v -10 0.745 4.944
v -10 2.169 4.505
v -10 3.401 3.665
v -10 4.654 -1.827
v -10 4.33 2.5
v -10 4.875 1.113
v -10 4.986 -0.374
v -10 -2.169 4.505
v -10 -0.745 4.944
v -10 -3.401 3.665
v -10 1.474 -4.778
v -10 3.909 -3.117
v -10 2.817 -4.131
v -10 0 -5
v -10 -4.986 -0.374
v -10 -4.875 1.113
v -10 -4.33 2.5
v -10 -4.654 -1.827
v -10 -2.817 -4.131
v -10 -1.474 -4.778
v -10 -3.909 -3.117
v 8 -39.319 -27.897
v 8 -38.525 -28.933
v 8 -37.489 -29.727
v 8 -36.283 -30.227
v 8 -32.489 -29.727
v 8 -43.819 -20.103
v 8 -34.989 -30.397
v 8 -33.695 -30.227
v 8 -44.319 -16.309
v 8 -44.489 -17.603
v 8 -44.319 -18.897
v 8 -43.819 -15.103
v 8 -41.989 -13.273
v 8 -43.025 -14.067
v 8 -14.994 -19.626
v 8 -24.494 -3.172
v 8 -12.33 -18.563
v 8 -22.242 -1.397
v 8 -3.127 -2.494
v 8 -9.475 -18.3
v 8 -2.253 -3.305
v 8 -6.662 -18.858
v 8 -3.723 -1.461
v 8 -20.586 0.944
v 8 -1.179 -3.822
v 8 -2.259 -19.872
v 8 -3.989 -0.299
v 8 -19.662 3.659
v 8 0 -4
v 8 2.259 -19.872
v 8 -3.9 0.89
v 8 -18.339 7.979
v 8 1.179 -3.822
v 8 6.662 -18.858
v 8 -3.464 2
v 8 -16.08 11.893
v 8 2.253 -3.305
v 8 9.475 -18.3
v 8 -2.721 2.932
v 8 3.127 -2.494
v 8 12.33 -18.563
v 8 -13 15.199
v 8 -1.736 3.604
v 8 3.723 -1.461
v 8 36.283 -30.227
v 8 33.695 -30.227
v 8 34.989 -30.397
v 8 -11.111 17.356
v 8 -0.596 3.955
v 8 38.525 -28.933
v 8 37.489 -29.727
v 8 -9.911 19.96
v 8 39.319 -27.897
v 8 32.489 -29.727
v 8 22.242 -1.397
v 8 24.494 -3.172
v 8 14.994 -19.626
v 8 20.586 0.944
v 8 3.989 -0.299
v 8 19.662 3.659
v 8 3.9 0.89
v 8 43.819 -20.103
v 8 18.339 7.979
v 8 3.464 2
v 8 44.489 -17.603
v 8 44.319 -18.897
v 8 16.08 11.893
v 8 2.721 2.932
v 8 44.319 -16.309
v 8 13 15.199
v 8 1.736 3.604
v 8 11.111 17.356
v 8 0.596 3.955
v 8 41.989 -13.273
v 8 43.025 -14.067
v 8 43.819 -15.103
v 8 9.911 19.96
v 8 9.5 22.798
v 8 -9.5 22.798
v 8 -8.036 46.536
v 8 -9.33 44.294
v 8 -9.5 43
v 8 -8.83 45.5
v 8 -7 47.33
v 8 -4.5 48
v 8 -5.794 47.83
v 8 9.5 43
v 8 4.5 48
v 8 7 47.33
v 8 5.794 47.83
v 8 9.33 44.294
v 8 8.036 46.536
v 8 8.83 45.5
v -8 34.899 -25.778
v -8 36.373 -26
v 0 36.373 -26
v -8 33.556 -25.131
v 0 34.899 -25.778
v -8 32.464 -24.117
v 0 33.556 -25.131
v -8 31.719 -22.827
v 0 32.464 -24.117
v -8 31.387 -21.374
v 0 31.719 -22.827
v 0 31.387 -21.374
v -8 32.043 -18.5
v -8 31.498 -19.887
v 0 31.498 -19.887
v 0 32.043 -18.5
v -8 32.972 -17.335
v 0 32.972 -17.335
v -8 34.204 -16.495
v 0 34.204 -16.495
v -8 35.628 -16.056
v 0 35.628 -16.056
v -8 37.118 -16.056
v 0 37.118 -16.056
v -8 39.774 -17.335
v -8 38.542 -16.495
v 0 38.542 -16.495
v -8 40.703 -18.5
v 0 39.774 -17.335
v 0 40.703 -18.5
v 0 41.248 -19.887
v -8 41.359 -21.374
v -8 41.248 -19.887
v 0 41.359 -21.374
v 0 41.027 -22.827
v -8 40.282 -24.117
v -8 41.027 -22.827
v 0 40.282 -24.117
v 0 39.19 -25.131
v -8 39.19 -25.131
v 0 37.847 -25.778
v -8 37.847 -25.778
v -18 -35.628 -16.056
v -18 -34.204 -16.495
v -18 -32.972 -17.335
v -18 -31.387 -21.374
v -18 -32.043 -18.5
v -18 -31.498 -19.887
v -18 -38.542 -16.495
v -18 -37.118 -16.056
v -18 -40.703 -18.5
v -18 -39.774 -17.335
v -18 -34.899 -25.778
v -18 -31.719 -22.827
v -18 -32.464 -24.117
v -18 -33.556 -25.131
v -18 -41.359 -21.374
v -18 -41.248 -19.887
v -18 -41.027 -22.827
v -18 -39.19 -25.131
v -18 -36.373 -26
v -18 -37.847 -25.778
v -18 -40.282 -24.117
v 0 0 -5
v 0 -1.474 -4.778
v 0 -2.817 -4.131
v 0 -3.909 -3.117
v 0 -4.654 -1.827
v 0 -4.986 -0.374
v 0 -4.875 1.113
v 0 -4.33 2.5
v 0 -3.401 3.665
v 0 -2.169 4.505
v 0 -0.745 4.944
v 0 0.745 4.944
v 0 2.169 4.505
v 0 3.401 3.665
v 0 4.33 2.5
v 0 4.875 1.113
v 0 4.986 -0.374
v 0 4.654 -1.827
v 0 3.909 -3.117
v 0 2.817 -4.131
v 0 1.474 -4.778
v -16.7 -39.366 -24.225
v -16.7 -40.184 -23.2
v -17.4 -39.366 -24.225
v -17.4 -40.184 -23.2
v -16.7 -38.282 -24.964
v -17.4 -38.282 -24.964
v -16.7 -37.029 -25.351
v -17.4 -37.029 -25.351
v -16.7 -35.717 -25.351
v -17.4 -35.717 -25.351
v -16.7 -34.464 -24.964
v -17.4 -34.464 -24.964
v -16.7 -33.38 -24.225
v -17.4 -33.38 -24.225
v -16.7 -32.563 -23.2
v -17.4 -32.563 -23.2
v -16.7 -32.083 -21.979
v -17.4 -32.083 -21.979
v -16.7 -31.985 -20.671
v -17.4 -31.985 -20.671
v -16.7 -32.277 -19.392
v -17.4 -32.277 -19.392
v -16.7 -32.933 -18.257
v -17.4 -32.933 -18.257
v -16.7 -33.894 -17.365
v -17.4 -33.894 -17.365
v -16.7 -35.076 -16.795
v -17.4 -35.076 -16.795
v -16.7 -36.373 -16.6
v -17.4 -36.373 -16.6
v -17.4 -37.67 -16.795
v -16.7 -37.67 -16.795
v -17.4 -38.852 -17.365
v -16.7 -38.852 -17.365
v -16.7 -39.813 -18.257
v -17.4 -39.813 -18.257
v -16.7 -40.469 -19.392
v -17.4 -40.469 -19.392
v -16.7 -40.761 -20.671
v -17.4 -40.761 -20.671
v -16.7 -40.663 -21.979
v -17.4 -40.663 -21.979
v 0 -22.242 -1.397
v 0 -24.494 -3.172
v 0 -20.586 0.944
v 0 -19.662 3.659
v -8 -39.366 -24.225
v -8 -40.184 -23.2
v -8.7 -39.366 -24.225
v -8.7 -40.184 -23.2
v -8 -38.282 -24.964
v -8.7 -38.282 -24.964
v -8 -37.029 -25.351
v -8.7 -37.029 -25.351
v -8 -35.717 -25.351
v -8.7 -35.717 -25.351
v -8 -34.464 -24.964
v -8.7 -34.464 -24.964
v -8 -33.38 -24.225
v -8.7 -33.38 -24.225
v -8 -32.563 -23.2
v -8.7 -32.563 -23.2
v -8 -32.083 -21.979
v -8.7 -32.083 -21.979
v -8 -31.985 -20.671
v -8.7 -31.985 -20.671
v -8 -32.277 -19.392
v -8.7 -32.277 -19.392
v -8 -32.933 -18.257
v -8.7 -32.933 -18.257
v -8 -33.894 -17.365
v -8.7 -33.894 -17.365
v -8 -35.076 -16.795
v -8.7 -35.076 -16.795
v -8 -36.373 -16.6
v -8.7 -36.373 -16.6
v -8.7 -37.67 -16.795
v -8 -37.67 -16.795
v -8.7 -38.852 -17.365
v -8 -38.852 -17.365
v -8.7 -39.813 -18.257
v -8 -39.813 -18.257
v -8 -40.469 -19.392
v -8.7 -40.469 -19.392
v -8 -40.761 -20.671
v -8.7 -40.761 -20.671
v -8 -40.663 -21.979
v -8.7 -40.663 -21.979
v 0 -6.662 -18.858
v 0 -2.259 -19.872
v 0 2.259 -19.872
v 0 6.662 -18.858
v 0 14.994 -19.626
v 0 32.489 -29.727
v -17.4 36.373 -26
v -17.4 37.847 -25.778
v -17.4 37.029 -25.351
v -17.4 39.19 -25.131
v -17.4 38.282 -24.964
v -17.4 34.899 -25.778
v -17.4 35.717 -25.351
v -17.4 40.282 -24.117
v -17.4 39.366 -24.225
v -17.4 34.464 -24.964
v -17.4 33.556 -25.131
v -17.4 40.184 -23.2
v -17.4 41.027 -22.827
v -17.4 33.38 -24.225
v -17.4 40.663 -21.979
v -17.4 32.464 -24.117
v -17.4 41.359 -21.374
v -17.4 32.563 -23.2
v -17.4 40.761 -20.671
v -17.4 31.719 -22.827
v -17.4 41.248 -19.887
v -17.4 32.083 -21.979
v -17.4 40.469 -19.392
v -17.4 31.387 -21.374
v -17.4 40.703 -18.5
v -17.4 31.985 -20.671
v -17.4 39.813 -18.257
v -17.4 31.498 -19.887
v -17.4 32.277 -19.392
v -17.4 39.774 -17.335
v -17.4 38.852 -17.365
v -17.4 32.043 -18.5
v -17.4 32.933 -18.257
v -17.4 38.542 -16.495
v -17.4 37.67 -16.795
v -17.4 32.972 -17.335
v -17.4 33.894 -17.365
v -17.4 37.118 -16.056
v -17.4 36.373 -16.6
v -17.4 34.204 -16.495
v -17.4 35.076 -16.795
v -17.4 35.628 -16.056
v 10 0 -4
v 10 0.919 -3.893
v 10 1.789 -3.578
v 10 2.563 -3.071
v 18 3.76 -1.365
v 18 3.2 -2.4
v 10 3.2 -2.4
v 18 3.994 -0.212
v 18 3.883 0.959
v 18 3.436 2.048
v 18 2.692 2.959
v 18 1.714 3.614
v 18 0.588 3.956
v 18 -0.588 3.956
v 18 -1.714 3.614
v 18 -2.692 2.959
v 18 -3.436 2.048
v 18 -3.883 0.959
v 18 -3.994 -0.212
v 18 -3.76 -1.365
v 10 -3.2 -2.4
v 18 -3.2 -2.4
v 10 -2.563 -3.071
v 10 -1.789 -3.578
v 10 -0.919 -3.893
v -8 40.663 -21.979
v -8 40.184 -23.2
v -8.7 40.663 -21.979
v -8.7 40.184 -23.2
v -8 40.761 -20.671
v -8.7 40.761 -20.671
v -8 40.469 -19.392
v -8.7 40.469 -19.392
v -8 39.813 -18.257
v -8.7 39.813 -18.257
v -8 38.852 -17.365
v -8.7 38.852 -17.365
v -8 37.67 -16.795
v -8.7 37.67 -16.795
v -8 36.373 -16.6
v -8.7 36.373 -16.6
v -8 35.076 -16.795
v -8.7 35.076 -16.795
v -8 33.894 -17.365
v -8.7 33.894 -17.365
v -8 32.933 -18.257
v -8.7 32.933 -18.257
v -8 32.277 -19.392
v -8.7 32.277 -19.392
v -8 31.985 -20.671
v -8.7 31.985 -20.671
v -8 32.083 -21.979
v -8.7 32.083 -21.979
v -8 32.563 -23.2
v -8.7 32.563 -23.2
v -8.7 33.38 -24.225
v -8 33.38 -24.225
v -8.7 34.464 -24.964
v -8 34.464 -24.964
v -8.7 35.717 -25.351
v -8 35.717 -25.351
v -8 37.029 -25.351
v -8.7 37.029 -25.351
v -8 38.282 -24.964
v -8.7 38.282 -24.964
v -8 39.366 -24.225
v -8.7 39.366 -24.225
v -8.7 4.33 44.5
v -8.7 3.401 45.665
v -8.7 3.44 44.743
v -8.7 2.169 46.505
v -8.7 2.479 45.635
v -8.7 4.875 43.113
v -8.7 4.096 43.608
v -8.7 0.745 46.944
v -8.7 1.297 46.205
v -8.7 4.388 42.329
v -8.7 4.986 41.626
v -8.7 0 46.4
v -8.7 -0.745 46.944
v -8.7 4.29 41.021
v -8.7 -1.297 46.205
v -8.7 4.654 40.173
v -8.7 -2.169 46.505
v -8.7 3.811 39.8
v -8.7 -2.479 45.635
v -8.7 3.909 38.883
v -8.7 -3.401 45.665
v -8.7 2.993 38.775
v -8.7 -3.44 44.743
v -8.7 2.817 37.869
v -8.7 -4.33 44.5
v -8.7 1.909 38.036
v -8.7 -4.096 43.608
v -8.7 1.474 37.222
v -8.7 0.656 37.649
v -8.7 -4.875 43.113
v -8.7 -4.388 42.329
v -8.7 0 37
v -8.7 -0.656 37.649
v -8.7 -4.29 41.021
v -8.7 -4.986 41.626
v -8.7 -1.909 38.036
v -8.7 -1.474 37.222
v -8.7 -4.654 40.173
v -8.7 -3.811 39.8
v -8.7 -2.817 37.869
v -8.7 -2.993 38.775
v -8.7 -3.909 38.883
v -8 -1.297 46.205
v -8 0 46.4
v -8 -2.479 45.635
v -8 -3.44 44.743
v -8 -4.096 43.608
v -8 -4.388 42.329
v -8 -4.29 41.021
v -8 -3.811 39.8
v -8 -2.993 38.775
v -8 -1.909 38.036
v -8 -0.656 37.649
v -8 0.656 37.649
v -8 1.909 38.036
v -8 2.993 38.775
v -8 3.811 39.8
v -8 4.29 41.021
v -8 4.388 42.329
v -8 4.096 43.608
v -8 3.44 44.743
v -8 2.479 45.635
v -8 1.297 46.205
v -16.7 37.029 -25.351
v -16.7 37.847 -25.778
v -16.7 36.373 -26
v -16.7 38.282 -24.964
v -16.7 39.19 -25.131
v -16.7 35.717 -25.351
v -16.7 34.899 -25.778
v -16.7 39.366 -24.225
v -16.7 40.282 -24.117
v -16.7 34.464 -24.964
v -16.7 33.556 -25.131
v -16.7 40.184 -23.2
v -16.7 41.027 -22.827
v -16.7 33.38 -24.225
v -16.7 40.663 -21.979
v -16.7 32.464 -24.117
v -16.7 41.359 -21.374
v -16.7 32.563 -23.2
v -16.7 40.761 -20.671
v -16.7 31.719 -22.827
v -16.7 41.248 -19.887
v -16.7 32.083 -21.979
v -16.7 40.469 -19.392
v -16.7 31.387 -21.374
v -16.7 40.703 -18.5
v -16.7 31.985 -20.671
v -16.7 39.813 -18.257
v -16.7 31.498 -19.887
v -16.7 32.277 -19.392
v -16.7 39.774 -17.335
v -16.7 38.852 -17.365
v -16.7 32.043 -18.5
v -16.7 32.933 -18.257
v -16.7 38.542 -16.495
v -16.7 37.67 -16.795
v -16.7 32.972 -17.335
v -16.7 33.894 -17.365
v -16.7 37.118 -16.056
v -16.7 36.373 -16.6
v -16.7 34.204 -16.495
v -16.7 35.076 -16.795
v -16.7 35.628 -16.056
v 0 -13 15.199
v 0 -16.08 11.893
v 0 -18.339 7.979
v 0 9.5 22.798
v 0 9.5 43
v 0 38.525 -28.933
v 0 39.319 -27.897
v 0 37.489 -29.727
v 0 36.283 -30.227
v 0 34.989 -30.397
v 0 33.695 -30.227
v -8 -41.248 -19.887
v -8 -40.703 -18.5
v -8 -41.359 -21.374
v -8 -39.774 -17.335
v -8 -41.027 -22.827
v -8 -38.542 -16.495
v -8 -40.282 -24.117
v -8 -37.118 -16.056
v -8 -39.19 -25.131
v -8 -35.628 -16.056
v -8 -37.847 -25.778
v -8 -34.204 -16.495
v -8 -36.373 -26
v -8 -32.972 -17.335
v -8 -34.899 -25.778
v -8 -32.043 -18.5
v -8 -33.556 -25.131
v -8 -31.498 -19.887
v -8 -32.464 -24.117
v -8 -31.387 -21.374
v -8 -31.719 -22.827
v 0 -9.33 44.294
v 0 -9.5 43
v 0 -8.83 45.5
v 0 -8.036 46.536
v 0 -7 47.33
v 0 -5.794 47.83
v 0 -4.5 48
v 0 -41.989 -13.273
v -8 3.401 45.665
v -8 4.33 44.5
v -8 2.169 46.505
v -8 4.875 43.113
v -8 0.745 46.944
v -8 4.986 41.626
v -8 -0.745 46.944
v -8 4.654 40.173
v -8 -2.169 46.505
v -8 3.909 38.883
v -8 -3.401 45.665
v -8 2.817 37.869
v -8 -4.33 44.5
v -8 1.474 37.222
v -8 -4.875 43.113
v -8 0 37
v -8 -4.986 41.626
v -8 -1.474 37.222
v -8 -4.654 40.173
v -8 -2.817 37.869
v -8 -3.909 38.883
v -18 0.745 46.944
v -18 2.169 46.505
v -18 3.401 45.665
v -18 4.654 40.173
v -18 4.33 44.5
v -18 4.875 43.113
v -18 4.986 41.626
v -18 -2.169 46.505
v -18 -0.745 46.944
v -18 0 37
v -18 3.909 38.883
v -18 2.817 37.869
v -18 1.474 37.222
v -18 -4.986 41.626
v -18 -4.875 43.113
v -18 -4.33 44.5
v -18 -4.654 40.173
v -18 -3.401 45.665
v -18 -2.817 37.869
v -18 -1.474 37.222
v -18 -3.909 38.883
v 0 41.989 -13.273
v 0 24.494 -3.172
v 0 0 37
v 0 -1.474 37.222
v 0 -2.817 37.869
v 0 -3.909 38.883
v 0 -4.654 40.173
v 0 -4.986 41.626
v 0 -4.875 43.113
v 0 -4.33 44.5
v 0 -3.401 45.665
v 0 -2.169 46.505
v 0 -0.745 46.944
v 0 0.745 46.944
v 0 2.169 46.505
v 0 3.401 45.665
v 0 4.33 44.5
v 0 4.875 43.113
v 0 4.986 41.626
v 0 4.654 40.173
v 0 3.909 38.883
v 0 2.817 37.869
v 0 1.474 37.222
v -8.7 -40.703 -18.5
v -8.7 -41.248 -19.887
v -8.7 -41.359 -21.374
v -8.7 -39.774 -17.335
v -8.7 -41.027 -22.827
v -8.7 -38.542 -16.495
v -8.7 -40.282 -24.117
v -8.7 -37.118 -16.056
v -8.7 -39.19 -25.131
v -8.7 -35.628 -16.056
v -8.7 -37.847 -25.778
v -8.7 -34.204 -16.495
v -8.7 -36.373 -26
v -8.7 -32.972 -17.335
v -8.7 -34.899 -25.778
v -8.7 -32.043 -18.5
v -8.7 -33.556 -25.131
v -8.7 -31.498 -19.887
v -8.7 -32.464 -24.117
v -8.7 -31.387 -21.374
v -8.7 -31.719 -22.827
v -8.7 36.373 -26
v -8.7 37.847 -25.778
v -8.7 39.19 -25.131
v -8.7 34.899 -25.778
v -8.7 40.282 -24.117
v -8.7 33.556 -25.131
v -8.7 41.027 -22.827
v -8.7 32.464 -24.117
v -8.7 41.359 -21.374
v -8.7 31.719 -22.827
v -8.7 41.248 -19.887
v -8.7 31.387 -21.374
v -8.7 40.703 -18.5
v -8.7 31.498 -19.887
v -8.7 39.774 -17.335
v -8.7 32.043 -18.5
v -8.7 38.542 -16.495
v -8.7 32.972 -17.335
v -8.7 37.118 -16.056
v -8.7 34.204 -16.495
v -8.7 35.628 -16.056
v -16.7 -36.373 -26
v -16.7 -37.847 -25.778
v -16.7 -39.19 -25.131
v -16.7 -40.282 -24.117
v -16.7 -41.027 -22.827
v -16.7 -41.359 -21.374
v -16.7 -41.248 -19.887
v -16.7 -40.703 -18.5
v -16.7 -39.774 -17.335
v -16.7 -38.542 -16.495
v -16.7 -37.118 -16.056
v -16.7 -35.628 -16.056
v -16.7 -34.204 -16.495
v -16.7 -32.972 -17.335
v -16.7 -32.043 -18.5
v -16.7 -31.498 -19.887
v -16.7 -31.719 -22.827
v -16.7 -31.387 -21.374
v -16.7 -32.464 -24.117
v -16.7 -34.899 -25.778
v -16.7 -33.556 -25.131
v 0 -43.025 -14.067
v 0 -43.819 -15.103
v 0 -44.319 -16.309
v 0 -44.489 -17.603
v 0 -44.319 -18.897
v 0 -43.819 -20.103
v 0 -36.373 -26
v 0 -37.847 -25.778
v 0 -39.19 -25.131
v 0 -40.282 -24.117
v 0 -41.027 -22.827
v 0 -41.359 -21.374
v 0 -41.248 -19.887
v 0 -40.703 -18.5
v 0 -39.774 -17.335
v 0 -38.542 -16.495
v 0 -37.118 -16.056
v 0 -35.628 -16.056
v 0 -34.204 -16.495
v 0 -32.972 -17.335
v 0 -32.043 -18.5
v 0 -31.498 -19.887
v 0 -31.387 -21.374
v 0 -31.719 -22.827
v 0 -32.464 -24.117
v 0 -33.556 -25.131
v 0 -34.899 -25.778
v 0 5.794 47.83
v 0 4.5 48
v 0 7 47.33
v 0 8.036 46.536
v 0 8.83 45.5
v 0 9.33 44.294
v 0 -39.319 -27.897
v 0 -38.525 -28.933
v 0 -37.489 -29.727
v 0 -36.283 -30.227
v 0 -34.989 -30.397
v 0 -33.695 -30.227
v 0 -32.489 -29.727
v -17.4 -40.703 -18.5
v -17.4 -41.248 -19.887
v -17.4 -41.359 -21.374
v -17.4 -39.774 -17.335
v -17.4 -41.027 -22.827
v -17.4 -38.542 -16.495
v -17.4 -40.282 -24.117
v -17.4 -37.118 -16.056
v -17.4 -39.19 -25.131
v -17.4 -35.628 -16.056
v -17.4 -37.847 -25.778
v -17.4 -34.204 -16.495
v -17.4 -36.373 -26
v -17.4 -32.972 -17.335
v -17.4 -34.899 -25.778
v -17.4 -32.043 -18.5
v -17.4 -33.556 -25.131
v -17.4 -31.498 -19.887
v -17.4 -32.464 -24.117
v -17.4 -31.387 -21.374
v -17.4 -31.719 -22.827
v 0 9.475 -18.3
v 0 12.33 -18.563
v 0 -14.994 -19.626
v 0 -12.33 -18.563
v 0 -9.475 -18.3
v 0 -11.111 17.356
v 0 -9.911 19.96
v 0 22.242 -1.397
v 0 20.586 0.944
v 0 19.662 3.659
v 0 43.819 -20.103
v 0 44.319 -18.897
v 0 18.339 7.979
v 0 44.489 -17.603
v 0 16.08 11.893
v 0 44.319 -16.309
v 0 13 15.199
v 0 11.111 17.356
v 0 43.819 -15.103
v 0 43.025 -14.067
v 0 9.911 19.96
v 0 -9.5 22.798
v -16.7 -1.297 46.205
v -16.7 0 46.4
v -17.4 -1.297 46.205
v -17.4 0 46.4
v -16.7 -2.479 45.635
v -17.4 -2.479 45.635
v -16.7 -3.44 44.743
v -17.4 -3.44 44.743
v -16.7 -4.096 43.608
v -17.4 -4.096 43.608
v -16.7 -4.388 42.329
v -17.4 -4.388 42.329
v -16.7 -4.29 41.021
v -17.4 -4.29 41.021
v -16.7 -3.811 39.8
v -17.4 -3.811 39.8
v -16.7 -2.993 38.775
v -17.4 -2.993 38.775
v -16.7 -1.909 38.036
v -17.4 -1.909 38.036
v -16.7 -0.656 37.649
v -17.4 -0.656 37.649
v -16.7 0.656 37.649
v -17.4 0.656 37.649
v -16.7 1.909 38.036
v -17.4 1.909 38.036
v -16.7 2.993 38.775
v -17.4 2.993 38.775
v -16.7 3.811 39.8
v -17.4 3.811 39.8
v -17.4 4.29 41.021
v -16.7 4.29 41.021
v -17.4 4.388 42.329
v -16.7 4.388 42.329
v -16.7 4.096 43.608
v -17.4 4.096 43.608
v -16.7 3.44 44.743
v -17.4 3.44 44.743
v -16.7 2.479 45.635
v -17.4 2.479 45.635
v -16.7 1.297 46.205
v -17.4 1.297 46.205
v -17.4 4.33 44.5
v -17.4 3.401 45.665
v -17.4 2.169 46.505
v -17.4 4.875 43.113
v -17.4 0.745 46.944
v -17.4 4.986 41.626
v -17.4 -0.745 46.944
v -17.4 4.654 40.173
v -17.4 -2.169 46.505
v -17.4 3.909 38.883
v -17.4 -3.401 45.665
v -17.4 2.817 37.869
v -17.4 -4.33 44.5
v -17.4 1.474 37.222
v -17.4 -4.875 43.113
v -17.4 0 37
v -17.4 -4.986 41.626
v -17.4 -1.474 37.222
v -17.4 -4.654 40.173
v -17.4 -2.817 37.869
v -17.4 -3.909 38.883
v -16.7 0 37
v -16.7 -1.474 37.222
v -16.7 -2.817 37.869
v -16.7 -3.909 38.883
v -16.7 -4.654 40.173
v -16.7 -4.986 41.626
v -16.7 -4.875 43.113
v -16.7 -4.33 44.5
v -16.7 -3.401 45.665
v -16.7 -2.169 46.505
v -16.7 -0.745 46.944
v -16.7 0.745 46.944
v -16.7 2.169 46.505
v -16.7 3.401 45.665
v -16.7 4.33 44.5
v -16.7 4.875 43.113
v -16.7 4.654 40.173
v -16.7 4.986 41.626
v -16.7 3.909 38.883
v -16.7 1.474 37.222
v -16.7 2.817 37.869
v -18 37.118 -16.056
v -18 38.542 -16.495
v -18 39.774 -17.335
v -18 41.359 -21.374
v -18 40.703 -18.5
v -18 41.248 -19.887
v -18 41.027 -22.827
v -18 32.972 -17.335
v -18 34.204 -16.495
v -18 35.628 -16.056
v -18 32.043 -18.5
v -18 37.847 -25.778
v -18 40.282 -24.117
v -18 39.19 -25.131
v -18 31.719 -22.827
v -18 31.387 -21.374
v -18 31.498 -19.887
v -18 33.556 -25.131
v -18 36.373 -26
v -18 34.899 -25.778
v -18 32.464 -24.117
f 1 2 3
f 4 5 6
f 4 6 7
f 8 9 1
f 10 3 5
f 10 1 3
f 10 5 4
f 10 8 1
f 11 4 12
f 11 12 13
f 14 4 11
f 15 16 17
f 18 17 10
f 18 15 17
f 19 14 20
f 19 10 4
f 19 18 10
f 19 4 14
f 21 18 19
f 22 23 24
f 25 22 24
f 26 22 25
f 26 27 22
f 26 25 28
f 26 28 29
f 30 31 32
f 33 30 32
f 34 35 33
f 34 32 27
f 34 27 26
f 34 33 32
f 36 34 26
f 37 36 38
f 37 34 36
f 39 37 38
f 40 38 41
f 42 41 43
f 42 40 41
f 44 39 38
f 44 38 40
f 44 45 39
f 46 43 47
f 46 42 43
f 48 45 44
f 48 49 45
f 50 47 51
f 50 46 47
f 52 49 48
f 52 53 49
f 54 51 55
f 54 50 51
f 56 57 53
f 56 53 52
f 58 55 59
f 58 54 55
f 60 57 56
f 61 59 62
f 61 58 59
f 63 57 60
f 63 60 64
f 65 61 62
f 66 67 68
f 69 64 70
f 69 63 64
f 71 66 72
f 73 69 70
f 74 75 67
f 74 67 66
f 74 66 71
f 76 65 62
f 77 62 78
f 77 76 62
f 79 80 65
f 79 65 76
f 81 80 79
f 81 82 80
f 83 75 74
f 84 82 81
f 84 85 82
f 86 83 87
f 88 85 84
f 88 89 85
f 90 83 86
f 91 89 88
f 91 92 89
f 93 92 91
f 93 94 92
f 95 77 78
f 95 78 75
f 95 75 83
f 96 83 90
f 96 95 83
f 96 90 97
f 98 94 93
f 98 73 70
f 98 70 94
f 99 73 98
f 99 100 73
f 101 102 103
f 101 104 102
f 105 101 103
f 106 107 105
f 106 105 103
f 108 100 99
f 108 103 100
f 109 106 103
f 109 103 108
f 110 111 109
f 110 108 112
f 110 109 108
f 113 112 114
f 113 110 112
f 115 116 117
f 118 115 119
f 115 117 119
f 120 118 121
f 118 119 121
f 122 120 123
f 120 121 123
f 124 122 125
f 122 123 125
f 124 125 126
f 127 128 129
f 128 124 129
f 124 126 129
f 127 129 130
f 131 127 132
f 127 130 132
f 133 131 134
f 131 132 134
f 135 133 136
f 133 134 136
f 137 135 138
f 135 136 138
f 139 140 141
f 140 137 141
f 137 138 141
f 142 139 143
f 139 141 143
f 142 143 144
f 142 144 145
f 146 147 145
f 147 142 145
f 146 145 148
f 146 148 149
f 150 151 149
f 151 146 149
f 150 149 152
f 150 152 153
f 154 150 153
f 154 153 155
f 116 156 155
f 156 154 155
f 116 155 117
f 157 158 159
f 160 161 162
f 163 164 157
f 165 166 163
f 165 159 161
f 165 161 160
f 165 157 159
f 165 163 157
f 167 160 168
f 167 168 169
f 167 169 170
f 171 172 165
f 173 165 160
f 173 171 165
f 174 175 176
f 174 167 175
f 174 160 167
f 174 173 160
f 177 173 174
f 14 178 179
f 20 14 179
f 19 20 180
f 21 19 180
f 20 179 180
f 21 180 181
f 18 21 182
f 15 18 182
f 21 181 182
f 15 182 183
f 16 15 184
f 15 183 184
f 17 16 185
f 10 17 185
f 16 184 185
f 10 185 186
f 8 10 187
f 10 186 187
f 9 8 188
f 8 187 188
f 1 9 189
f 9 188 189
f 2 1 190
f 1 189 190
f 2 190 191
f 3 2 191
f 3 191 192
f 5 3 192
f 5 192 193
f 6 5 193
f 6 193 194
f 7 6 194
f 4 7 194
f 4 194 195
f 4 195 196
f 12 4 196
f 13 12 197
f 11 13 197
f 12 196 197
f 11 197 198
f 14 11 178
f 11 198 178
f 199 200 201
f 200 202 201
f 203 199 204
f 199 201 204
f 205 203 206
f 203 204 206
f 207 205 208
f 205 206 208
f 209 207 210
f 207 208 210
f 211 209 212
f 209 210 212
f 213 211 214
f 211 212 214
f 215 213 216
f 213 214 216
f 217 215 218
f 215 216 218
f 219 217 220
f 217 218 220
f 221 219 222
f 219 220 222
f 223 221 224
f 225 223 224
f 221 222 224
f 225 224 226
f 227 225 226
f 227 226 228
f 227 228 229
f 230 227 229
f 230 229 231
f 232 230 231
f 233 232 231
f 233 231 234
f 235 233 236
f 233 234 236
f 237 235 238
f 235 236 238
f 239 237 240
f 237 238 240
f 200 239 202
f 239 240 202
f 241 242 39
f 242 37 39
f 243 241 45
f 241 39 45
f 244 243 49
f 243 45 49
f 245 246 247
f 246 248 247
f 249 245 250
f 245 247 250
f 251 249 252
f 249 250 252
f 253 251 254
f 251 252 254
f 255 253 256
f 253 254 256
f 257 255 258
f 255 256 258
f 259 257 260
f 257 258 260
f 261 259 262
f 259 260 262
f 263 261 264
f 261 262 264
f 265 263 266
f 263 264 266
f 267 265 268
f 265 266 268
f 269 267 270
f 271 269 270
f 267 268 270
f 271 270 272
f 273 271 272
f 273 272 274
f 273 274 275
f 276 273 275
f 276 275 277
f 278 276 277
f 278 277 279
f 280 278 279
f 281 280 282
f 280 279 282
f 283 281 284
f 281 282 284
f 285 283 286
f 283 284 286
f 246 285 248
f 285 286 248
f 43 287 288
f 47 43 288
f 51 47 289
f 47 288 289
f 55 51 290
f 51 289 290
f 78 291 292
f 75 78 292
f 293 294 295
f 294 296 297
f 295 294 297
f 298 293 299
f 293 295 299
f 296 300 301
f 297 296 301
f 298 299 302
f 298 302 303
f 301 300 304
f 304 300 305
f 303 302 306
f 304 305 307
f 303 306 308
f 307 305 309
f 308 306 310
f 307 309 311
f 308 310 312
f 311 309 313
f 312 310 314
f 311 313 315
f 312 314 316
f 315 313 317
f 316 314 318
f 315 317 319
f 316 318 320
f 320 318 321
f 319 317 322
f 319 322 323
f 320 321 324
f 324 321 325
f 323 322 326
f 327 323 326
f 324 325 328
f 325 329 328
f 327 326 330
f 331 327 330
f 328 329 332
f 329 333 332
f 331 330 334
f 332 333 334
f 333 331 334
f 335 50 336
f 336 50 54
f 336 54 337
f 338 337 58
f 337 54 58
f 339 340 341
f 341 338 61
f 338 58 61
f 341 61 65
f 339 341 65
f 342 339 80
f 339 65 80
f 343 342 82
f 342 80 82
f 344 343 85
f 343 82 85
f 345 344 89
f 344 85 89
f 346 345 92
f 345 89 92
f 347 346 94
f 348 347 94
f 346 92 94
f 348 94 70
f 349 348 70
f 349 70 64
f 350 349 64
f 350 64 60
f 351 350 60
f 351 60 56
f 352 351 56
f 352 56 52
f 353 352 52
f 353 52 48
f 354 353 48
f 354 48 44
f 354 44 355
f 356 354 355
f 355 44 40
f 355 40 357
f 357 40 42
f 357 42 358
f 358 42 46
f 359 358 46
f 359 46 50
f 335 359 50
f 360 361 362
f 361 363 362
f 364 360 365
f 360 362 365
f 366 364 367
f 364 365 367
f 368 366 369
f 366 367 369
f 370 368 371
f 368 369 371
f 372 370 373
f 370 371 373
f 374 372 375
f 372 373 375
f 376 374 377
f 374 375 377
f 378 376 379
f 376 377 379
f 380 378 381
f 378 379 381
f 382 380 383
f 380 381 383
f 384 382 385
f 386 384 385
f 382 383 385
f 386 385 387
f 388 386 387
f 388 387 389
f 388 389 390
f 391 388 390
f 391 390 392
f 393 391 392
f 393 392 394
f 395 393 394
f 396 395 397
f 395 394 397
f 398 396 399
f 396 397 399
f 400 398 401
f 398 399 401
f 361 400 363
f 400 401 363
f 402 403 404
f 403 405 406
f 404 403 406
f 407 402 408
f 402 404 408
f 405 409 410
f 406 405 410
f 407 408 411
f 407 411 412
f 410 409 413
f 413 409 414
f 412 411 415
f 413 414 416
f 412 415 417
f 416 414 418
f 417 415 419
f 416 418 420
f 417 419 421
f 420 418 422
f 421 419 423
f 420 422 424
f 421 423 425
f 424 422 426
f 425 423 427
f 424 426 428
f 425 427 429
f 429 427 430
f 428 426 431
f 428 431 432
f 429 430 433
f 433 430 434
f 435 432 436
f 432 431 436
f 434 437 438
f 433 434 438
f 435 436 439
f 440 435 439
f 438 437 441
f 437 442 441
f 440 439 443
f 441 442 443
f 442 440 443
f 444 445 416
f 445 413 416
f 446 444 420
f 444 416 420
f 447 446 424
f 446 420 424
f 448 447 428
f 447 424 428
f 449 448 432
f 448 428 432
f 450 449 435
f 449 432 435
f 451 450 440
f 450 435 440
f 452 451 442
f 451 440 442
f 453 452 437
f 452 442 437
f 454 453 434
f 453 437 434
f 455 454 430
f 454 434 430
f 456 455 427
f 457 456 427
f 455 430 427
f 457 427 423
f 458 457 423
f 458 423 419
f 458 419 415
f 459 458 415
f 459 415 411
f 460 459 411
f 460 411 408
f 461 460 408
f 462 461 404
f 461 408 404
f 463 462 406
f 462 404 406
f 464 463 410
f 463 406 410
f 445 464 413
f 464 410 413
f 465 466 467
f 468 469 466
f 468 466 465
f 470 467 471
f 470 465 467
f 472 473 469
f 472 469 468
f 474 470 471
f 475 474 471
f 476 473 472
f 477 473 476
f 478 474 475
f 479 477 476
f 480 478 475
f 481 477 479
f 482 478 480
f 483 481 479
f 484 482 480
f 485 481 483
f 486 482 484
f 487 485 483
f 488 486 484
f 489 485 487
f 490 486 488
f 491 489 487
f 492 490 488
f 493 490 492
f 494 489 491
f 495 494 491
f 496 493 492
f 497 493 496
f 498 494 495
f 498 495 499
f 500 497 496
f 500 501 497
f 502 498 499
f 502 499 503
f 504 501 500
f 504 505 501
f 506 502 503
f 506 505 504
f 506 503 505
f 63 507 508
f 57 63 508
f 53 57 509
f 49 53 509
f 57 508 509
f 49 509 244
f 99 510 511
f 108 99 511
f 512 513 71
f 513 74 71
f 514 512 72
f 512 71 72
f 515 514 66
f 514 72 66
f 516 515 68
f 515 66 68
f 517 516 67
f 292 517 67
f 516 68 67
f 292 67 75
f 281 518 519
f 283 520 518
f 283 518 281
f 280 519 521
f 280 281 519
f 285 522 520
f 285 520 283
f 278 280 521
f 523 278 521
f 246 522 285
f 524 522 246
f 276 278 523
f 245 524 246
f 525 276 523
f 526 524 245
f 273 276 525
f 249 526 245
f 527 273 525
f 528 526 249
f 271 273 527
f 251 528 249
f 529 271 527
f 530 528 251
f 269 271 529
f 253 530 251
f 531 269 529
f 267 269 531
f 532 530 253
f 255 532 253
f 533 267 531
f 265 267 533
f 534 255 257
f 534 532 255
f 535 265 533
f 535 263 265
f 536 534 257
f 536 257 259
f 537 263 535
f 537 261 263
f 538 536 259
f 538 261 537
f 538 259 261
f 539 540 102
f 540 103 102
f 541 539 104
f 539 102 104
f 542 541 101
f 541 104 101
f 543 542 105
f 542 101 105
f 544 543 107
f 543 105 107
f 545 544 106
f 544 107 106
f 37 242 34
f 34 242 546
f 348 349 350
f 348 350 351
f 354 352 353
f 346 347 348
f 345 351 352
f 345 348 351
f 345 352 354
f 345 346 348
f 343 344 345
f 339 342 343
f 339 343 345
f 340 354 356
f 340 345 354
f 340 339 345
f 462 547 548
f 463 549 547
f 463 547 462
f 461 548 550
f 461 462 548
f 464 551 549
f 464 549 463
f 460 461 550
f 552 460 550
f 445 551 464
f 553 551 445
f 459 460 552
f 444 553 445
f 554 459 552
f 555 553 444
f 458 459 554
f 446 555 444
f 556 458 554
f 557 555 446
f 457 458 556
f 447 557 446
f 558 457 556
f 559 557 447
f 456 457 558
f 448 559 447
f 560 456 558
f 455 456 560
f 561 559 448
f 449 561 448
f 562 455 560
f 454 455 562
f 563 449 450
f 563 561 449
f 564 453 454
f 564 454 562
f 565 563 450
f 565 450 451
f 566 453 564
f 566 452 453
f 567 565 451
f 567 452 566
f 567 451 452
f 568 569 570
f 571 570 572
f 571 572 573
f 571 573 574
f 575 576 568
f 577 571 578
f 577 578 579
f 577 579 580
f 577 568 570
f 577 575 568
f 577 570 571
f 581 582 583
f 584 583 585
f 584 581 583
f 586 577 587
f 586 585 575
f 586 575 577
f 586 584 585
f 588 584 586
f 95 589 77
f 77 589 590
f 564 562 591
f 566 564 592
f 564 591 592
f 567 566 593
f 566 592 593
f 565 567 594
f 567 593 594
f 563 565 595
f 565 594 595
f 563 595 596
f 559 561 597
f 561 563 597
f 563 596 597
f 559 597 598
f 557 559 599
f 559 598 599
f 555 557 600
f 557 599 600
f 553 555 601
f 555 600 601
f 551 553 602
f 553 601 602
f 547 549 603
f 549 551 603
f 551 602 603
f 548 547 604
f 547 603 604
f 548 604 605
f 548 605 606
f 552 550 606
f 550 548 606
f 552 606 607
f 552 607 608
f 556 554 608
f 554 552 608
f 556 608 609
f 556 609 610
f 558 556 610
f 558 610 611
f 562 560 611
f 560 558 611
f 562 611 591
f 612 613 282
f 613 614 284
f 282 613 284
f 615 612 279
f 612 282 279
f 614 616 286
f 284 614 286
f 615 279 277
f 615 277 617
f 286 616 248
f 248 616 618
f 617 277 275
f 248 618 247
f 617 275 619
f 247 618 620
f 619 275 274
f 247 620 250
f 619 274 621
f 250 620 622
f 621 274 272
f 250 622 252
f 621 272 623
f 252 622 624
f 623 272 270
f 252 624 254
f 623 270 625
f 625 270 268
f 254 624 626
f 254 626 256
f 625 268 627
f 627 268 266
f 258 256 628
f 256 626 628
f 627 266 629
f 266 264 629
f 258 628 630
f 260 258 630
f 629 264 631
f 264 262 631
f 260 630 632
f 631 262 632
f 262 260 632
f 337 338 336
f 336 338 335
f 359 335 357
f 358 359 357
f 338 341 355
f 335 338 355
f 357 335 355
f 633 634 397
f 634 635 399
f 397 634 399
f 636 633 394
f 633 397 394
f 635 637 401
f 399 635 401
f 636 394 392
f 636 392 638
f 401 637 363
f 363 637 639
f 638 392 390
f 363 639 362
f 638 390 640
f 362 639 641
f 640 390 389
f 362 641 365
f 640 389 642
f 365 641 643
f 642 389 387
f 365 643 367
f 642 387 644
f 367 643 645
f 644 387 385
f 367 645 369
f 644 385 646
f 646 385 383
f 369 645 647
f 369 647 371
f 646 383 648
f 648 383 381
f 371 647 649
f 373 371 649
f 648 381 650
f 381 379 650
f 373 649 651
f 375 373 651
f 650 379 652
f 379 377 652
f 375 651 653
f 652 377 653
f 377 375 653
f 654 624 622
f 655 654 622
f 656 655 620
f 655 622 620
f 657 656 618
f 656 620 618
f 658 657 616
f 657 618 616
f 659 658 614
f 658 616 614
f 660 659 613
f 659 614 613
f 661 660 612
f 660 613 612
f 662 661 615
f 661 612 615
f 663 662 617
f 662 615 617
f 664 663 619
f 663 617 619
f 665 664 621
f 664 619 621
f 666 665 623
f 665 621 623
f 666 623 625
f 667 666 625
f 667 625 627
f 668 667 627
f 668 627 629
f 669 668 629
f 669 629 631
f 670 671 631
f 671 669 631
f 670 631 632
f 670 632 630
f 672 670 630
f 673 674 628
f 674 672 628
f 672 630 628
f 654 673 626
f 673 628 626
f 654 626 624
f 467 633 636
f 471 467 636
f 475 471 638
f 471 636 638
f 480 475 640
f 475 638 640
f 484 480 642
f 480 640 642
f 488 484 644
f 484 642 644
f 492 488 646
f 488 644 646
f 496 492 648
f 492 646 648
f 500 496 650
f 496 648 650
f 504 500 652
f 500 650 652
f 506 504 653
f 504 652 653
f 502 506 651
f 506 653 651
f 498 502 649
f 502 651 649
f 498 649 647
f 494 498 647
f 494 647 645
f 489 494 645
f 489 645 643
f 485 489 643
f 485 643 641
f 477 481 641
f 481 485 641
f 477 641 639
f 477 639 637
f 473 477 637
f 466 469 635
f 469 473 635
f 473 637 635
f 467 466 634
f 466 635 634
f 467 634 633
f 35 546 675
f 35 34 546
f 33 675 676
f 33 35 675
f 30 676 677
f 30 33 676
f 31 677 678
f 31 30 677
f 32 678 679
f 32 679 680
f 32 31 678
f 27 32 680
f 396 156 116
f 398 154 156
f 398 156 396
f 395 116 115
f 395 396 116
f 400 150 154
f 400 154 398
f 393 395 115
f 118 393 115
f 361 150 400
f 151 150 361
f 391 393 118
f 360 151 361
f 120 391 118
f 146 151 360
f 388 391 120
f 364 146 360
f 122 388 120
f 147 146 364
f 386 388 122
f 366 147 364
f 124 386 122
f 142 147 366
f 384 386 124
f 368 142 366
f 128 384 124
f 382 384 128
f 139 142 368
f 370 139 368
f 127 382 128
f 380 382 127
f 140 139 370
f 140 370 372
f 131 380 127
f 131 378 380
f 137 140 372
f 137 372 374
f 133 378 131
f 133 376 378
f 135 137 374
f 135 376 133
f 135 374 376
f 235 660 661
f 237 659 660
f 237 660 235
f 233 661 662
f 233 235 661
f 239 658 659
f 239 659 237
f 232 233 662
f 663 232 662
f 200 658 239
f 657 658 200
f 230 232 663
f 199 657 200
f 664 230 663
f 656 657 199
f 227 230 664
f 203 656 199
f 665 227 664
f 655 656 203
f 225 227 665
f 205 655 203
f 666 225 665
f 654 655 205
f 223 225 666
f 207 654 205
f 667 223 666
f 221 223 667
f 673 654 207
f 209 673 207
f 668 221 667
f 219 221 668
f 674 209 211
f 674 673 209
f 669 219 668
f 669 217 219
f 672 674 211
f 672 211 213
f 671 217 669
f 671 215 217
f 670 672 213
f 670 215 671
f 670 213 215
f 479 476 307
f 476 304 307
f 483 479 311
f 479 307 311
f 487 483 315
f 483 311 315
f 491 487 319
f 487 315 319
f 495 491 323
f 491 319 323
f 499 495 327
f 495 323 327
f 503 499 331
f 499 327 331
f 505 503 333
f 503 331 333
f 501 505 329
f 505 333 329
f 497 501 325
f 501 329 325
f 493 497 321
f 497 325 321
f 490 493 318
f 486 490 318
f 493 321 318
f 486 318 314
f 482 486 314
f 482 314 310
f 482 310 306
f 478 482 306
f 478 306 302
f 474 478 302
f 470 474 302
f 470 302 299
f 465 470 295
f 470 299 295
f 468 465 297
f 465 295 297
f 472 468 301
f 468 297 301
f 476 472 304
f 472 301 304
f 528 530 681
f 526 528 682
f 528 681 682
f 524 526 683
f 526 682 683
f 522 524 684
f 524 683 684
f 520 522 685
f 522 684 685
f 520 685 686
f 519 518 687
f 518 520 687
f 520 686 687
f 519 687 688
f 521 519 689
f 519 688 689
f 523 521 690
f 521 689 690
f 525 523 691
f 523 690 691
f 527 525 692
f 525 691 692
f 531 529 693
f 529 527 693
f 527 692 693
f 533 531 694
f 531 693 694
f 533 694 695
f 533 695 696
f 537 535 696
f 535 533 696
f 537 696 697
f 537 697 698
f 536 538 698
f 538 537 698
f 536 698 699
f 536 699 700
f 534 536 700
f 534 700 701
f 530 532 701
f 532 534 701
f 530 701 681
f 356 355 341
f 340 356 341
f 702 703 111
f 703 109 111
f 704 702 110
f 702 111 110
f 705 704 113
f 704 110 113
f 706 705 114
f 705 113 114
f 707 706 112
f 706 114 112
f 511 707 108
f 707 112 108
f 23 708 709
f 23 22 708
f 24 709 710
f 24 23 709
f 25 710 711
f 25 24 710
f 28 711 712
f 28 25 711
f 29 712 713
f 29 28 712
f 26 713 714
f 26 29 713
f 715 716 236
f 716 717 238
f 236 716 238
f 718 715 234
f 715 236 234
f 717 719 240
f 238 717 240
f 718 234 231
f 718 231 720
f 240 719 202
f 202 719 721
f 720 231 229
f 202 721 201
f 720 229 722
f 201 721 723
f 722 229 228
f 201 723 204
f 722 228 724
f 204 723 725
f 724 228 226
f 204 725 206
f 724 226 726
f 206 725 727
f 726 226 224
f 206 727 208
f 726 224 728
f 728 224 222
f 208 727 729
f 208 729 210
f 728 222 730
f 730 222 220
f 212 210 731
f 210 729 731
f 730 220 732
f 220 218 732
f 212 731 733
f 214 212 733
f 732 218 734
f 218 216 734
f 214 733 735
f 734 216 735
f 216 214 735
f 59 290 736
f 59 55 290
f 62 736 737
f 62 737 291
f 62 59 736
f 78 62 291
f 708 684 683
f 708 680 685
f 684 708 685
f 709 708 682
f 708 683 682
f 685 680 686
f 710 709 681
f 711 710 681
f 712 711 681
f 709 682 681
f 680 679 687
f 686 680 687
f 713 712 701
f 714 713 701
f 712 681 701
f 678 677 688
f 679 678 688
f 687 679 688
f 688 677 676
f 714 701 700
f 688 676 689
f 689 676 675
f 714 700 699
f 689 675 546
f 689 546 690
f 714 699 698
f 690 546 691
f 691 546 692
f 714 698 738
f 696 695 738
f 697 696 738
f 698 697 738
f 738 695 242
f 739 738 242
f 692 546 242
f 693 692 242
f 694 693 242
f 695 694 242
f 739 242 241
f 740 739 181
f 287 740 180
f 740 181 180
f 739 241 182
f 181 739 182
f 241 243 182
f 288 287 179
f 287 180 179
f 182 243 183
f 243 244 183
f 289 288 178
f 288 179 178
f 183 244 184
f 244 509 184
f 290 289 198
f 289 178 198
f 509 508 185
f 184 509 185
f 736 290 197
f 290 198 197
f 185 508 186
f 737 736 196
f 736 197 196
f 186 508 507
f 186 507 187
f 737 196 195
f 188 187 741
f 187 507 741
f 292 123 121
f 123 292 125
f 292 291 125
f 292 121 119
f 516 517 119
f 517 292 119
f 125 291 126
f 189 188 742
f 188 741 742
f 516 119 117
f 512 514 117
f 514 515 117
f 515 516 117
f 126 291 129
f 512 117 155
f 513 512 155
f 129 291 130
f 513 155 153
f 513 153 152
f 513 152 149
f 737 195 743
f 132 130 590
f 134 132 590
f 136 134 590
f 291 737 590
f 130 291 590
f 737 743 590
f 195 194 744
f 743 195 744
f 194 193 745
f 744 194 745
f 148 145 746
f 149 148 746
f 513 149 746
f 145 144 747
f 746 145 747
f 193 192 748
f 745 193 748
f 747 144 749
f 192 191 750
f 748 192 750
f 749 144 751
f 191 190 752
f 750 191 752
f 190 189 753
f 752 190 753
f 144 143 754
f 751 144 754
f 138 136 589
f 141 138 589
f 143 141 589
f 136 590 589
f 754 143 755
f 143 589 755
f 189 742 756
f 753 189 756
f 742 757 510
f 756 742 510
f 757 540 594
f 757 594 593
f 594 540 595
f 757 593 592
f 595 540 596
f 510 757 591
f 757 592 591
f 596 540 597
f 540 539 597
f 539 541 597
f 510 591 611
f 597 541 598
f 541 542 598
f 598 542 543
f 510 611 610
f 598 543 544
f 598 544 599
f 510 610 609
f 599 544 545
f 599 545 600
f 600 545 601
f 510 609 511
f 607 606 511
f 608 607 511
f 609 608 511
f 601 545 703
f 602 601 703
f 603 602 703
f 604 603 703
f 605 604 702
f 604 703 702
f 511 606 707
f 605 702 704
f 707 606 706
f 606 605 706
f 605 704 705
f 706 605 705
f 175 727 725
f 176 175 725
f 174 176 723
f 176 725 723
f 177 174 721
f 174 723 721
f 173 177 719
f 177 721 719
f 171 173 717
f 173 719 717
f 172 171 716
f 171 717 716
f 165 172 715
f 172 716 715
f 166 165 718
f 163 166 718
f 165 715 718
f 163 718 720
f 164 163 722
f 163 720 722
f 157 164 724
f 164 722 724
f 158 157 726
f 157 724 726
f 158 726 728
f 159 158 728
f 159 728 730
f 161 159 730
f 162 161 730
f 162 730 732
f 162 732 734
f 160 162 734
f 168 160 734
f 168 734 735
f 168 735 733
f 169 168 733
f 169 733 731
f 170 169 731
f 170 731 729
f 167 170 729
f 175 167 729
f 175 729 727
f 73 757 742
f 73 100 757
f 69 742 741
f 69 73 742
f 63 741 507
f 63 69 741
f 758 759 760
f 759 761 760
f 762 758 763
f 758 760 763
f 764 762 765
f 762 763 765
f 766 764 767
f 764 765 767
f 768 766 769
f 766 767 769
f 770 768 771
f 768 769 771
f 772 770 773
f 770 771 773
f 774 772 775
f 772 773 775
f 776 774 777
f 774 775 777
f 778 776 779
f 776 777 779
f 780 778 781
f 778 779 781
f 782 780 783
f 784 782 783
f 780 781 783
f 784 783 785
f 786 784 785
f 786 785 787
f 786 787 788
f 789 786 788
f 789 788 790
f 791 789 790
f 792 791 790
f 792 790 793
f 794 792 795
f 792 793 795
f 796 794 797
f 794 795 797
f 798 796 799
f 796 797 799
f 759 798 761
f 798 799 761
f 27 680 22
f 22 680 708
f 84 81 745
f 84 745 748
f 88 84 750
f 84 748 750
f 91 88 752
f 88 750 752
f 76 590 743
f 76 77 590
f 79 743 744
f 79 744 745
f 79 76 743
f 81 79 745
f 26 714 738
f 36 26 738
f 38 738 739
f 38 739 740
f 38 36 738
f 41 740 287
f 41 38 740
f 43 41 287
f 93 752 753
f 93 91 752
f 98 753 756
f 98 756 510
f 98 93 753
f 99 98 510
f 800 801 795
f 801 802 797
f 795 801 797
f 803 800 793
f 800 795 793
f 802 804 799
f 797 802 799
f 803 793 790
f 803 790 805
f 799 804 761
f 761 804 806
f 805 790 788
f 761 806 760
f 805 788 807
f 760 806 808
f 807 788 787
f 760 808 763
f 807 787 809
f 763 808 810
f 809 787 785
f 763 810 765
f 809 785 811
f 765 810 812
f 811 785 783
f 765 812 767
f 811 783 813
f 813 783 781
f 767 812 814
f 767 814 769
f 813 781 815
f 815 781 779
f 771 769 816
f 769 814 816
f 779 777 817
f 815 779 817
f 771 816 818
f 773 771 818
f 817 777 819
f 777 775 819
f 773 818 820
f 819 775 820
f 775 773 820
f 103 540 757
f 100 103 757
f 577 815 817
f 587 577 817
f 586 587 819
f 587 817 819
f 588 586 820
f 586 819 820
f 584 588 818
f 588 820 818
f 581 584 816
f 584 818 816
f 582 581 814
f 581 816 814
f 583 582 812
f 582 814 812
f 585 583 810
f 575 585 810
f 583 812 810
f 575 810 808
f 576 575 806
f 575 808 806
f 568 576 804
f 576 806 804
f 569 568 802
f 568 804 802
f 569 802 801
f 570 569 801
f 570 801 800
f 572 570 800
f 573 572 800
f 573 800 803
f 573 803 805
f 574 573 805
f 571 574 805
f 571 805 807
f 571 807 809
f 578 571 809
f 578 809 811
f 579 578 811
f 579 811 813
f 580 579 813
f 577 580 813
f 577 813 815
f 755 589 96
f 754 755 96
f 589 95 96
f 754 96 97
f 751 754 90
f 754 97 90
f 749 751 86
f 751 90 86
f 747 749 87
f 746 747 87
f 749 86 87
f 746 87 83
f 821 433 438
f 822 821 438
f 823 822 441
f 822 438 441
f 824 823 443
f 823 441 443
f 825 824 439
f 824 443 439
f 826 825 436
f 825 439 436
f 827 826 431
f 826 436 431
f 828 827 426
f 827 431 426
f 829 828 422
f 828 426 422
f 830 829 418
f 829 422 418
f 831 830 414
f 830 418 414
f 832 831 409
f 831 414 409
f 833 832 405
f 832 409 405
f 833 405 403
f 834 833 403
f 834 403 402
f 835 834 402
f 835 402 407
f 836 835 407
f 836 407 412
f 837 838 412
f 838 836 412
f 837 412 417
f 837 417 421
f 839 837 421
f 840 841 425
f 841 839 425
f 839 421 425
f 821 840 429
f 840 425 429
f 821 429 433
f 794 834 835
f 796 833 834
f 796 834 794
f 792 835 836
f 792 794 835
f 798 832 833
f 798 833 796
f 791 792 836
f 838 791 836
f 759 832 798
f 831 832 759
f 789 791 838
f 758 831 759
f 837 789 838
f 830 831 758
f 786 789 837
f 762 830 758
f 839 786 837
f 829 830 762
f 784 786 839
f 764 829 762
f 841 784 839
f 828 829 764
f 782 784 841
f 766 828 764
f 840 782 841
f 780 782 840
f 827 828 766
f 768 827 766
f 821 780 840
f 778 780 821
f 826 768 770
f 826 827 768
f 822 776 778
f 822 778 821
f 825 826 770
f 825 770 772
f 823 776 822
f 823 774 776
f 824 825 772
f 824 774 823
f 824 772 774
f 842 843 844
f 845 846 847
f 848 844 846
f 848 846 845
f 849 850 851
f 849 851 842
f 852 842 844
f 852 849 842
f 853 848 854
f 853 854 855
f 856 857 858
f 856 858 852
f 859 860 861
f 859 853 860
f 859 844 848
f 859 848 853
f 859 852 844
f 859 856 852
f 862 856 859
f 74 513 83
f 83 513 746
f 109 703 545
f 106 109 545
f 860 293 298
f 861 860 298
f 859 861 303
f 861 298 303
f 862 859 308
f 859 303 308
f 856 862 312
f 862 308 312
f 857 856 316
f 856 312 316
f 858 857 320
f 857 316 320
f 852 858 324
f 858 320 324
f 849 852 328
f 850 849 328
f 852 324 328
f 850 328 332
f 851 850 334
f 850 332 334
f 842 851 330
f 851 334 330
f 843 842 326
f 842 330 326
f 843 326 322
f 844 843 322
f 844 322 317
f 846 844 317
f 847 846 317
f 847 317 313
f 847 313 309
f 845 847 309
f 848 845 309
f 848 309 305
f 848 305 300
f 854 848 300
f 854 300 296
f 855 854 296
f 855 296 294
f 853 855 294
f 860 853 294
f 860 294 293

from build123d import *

# Parameters (mm, degrees)
BOSS_EXTRUDE2_DEPTH = 8
FILLET1_R           = 10
FILLET3_R           = 5
FILLET4_R           = 5
SKETCH3_R           = 5
BOSS_EXTRUDE3_DEPTH = 10
SKETCH2_R           = 5
BOSS_EXTRUDE4_DEPTH = 18
SKETCH4_R           = 4
BOSS_EXTRUDE5_DEPTH = 10
CUT_EXTRUDE1_START  = -8
CUT_EXTRUDE1_DEPTH  = 8
SKETCH7_W           = 0.7
SKETCH7_H           = 1.2
CIRPATTERN1_COUNT   = 3


with BuildPart() as part:
    # Sketch1 → Boss-Extrude2 (new body)
    with BuildSketch(Plane.YZ):
        with BuildLine():
            Line((-19.991801075, -0.572616617), (-46.319219382, -15.772758664))
            Line((-46.319219382, -15.772758664), (-36.819219382, -32.227241336))
            Line((-36.819219382, -32.227241336), (-10.491801075, -17.027099289))
            ThreePointArc((-10.491801075, -17.027099289), (0, -20), (10.491801075, -17.027099289))
            Line((10.491801075, -17.027099289), (36.819219382, -32.227241336))
            Line((36.819219382, -32.227241336), (46.319219382, -15.772758664))
            Line((46.319219382, -15.772758664), (19.991801075, -0.572616617))
            ThreePointArc((19.991801075, -0.572616617), (17.320508076, 10), (9.5, 17.599715907))
            Line((9.5, 17.599715907), (9.5, 48))
            Line((9.5, 48), (-9.5, 48))
            Line((-9.5, 48), (-9.5, 17.599715907))
            ThreePointArc((-9.5, 17.599715907), (-17.320508076, 10), (-19.991801075, -0.572616617))
        make_face()
    extrude(amount=BOSS_EXTRUDE2_DEPTH)

    # Fillet1
    fillet1_edges = [part.edges().sort_by_distance(p)[0] for p in [
        (4, 9.5, 17.599715907),
        (4, 19.991801075, -0.572616617),
        (4, 10.491801075, -17.027099289),
        (4, -10.491801075, -17.027099289),
        (4, -19.991801075, -0.572616617),
        (4, -9.5, 17.599715907),
    ]]
    fillet(fillet1_edges, radius=FILLET1_R)

    # Fillet3
    fillet3_edges = [part.edges().sort_by_distance(p)[0] for p in [
        (4, -9.5, 48),
        (4, 9.5, 48),
    ]]
    fillet(fillet3_edges, radius=FILLET3_R)

    # Fillet4
    fillet4_edges = [part.edges().sort_by_distance(p)[0] for p in [
        (4, 46.319219382, -15.772758664),
        (4, 36.819219382, -32.227241336),
        (4, -36.819219382, -32.227241336),
        (4, -46.319219382, -15.772758664),
    ]]
    fillet(fillet4_edges, radius=FILLET4_R)

    # Sketch3 → Boss-Extrude3 (add)
    with BuildSketch(Plane(origin=(0, 0, 0), x_dir=(0, -1, 0), z_dir=(-1, 0, 0))):
        with Locations(Location((0, 0, 0), (0, 0, 270))):
            Circle(SKETCH3_R)
    extrude(amount=BOSS_EXTRUDE3_DEPTH)

    # Sketch2 → Boss-Extrude4 (add)
    with BuildSketch(Plane(origin=(0, 0, 0), x_dir=(0, -1, 0), z_dir=(-1, 0, 0))):
        with Locations(Location((0, 42, 0), (0, 0, 270))):
            Circle(SKETCH2_R)
        with Locations(Location((-36.373066959, -21, 0), (0, 0, 270))):
            Circle(SKETCH2_R)
        with Locations(Location((36.373066959, -21, 0), (0, 0, 270))):
            Circle(SKETCH2_R)
    extrude(amount=BOSS_EXTRUDE4_DEPTH)

    # Sketch4 → Boss-Extrude5 (add)
    with BuildSketch(Plane.YZ.offset(8)):
        with Locations(Location((0, 0, 0), (0, 0, 270))):
            Circle(SKETCH4_R)
    extrude(amount=BOSS_EXTRUDE5_DEPTH)

    # Sketch5 → Cut-Extrude1 (cut)
    with BuildSketch(Plane.YZ.offset(18).offset(CUT_EXTRUDE1_START)):
        with BuildLine():
            Line((-3.2, -2.4), (3.2, -2.4))
            ThreePointArc((3.2, -2.4), (0, -4), (-3.2, -2.4))
        make_face()
    extrude(amount=CUT_EXTRUDE1_DEPTH, mode=Mode.SUBTRACT)

    # Sketch7 → Cut-Revolve1 (revolve, cut)
    with BuildSketch(Plane(origin=(0, 0, 0), x_dir=(-1, 0, 0), z_dir=(0, 1, 0))):
        with Locations((8.35, 47)):
            Rectangle(SKETCH7_W, SKETCH7_H)
        with Locations((17.05, 47)):
            Rectangle(SKETCH7_W, SKETCH7_H)
    cut_revolve1 = revolve(axis=Axis((-21.815535784, 0, 42), (1, 0, 0)), mode=Mode.SUBTRACT)

    # CirPattern1: Cut-Revolve1 ×3 about axis
    cirpattern1_axis = Axis((0, 0, 0), (1, 0, 0))
    for i in range(1, CIRPATTERN1_COUNT):
        add(cut_revolve1.rotate(cirpattern1_axis, i * 360 / CIRPATTERN1_COUNT), mode=Mode.SUBTRACT)


solid = part.part
